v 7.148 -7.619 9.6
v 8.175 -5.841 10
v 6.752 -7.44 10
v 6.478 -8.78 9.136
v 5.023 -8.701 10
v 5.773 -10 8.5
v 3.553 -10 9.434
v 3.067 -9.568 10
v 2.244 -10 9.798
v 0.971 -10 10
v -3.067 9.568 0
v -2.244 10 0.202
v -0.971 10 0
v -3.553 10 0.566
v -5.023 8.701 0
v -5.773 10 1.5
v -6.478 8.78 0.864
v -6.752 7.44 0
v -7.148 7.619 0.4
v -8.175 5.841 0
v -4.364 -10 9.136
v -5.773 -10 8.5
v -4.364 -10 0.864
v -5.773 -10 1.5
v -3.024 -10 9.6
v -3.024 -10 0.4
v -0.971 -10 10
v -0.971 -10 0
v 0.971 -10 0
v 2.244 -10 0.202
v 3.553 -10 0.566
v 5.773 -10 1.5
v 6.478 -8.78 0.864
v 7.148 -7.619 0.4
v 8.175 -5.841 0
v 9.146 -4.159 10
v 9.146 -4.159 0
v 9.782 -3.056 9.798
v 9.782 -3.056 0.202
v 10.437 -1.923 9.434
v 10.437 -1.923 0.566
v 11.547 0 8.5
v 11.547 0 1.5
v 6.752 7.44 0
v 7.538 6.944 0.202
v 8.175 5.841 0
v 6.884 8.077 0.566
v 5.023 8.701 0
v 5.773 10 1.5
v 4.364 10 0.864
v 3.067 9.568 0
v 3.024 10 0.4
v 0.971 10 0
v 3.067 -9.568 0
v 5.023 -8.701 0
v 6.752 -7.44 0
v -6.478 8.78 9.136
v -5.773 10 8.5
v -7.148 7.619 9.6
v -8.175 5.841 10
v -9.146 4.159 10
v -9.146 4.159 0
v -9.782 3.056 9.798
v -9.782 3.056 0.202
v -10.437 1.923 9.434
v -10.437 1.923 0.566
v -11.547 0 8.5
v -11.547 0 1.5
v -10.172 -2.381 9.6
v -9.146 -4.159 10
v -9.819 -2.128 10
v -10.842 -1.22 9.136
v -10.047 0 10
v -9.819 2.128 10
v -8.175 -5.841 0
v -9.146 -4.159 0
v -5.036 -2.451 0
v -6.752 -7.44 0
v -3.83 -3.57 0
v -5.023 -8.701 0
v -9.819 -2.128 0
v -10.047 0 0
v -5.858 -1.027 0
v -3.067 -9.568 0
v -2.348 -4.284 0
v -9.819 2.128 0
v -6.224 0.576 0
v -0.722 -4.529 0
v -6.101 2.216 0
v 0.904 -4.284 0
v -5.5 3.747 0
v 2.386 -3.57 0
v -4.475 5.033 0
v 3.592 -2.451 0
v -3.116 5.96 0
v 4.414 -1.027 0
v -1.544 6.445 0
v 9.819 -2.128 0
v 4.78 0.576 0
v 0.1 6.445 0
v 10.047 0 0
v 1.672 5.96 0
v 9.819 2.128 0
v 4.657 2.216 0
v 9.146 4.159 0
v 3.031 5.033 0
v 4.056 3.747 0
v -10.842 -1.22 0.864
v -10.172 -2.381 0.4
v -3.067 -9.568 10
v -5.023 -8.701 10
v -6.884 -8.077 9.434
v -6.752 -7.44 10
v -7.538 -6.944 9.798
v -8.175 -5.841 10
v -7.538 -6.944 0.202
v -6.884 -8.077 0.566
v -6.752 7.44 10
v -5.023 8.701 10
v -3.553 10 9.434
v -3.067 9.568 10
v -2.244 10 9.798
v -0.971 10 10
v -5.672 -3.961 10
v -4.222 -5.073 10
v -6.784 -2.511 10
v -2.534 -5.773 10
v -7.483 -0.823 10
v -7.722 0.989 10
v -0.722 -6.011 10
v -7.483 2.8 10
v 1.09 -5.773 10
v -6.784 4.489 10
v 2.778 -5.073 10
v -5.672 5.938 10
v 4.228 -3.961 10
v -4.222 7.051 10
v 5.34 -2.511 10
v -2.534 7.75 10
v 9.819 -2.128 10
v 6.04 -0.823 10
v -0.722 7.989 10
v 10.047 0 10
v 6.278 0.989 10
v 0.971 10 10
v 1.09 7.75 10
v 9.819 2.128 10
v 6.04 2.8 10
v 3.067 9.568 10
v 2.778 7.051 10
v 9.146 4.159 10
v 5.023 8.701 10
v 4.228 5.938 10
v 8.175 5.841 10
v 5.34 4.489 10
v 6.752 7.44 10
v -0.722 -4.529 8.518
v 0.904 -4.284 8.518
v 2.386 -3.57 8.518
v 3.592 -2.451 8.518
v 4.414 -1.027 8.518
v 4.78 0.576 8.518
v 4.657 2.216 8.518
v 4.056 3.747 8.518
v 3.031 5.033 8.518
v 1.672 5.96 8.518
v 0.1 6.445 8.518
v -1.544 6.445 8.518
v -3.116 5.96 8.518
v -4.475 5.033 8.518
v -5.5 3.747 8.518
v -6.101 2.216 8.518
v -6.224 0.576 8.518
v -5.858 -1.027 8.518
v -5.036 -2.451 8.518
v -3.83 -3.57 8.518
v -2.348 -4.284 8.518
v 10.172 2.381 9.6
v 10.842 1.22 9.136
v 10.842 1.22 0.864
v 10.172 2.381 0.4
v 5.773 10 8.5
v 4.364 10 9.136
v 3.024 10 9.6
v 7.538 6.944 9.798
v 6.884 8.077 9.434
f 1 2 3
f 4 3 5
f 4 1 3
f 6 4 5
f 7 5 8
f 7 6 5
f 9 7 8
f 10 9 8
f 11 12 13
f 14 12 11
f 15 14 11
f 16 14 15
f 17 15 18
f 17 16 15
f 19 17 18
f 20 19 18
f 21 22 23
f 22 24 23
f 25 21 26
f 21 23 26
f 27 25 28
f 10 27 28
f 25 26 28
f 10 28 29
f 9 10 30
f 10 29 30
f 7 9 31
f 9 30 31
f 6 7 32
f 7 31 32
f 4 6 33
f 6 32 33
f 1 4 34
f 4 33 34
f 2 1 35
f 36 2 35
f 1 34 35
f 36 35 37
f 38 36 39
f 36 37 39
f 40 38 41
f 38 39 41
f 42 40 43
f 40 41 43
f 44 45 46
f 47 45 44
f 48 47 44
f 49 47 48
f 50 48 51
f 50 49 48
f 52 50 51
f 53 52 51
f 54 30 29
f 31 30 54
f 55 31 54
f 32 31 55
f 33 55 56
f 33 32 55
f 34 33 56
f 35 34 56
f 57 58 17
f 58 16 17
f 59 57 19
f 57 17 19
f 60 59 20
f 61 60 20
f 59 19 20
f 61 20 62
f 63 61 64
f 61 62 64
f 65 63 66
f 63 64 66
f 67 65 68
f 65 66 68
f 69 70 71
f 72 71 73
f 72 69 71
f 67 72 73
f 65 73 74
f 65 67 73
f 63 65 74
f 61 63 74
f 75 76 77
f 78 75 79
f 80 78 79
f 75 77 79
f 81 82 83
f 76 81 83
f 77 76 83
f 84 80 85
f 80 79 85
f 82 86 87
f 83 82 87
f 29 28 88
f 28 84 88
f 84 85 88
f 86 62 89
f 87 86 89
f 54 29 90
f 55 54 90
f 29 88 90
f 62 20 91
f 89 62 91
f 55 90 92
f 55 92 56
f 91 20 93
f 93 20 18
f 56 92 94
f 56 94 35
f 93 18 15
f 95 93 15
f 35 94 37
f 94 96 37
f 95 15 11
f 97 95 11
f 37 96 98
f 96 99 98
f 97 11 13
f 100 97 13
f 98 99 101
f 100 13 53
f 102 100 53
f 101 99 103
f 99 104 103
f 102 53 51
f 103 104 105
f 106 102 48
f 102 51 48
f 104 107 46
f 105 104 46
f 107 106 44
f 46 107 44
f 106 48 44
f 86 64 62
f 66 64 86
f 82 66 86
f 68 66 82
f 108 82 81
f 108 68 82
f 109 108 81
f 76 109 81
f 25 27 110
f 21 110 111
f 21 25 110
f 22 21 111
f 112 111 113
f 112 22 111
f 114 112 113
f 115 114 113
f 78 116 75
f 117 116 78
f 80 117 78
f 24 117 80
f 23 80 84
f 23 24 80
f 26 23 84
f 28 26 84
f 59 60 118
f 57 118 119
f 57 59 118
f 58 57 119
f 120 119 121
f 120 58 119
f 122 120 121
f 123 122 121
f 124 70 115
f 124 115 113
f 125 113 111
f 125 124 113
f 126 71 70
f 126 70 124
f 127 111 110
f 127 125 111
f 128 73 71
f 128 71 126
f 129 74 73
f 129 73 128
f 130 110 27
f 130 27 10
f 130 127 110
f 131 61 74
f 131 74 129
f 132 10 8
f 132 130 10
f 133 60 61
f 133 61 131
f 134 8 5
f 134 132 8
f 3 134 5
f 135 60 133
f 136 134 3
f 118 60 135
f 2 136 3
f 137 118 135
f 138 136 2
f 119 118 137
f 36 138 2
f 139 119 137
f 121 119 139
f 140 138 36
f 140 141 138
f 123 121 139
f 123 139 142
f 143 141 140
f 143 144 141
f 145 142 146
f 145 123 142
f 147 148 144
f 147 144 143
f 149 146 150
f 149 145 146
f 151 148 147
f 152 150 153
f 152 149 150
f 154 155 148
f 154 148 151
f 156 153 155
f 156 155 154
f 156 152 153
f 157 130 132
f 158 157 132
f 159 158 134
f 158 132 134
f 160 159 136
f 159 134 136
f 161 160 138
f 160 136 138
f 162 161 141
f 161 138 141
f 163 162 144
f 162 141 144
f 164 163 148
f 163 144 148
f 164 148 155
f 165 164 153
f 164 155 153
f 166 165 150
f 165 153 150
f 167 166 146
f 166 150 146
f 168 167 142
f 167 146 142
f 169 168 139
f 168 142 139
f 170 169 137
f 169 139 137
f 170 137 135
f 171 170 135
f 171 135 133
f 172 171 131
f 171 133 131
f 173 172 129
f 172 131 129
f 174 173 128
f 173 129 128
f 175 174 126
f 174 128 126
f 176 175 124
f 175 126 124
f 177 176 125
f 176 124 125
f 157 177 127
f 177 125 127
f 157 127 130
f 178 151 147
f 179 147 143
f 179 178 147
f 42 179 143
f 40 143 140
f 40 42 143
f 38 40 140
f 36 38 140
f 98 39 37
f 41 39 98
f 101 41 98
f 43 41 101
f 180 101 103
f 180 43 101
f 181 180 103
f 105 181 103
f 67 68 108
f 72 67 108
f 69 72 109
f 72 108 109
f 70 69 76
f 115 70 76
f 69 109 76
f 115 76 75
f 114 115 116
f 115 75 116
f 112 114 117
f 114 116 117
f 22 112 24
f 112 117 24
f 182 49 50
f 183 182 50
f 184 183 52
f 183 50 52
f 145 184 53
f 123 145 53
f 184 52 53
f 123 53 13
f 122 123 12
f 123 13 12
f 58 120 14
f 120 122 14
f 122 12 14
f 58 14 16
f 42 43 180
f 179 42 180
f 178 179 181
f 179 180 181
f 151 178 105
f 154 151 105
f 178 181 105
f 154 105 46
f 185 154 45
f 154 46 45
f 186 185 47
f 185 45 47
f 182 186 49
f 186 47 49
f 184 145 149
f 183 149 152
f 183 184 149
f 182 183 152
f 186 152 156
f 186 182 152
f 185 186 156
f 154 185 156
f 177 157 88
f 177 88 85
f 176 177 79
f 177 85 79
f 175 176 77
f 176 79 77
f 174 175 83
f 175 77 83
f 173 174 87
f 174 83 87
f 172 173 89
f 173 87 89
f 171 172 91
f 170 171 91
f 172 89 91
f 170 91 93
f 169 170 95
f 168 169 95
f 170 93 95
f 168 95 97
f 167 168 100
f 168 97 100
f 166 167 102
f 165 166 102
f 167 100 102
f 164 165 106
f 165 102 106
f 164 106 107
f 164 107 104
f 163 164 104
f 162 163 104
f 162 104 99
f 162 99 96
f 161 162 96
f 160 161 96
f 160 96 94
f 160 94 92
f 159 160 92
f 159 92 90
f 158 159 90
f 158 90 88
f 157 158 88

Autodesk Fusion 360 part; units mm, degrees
sketch "Hex Polygon" plane through (0, 0, 0) normal (0, 0, 1) x (1, 0, 0) in component "Hex Nut"
  line L0 (-5.7735, 10) -> (-11.547, 0)
  line L1 (-11.547, 0) -> (-5.7735, -10)
  line L2 (-5.7735, -10) -> (5.7735, -10)
  line L3 (5.7735, -10) -> (11.547, 0)
  line L4 (11.547, 0) -> (5.7735, 10)
  line L5 (5.7735, 10) -> (-5.7735, 10)
  dimension "d1" = 10
extrude "Extrude1" add sketch "Hex Polygon" along normal blind 10 in component "Hex Nut"
sketch "Chamfer Cutout" plane through (0, 0, 0) normal (0, 1, 0) x (1, 0, 0) in component "Hex Nut"
  line L0 (11.547, -10) -> (10.047, -10)
  line L1 (10.047, -10) -> (11.547, -8.5)
  line L2 (11.547, -8.5) -> (11.547, -10)
  point P0 (11.547, -10)
  dimension "d4" = 1.5
revolve "Revolve1" cut sketch "Chamfer Cutout" angle 360 about axis through (0, 0, 1.75) along (0, 0, 1) in component "Hex Nut"
hole "Hole1" at (-0.7219, 0.9887, 10) direction (0, 0, -1) diameter 11.035 end through all countersink diameter 14 countersink angle 90 in component "Hex Nut"
thread "Thread1" "GB Metric profile 12.0 M12x1 6H" thread offset 0 thread depth 8.5 in component "Hex Nut"
ref_plane "WorkPlane1" through (0, 0, 5) normal (0, 0, 1) x (1, 0, 0) in component "Hex Nut"
mirror "Mirror1" about plane through (0, 0, 5) normal (0, 0, 1) of 7 faces at (10.7886, 0.4867, 9.2475) (4.9728, -9.5865, 9.2475) (-4.9728, -9.5865, 9.2475) (0.1071, -8.6444, 10) (4.9728, 9.5865, 9.2475) (-10.7886, -0.4867, 9.2475) (-4.9728, 9.5865, 9.2475) in component "Hex Nut"
component "Hex Nut" placed x (1, 0, 0) y (0, 1, 0) z (0, 0, 1) at (0, 0, 0)
